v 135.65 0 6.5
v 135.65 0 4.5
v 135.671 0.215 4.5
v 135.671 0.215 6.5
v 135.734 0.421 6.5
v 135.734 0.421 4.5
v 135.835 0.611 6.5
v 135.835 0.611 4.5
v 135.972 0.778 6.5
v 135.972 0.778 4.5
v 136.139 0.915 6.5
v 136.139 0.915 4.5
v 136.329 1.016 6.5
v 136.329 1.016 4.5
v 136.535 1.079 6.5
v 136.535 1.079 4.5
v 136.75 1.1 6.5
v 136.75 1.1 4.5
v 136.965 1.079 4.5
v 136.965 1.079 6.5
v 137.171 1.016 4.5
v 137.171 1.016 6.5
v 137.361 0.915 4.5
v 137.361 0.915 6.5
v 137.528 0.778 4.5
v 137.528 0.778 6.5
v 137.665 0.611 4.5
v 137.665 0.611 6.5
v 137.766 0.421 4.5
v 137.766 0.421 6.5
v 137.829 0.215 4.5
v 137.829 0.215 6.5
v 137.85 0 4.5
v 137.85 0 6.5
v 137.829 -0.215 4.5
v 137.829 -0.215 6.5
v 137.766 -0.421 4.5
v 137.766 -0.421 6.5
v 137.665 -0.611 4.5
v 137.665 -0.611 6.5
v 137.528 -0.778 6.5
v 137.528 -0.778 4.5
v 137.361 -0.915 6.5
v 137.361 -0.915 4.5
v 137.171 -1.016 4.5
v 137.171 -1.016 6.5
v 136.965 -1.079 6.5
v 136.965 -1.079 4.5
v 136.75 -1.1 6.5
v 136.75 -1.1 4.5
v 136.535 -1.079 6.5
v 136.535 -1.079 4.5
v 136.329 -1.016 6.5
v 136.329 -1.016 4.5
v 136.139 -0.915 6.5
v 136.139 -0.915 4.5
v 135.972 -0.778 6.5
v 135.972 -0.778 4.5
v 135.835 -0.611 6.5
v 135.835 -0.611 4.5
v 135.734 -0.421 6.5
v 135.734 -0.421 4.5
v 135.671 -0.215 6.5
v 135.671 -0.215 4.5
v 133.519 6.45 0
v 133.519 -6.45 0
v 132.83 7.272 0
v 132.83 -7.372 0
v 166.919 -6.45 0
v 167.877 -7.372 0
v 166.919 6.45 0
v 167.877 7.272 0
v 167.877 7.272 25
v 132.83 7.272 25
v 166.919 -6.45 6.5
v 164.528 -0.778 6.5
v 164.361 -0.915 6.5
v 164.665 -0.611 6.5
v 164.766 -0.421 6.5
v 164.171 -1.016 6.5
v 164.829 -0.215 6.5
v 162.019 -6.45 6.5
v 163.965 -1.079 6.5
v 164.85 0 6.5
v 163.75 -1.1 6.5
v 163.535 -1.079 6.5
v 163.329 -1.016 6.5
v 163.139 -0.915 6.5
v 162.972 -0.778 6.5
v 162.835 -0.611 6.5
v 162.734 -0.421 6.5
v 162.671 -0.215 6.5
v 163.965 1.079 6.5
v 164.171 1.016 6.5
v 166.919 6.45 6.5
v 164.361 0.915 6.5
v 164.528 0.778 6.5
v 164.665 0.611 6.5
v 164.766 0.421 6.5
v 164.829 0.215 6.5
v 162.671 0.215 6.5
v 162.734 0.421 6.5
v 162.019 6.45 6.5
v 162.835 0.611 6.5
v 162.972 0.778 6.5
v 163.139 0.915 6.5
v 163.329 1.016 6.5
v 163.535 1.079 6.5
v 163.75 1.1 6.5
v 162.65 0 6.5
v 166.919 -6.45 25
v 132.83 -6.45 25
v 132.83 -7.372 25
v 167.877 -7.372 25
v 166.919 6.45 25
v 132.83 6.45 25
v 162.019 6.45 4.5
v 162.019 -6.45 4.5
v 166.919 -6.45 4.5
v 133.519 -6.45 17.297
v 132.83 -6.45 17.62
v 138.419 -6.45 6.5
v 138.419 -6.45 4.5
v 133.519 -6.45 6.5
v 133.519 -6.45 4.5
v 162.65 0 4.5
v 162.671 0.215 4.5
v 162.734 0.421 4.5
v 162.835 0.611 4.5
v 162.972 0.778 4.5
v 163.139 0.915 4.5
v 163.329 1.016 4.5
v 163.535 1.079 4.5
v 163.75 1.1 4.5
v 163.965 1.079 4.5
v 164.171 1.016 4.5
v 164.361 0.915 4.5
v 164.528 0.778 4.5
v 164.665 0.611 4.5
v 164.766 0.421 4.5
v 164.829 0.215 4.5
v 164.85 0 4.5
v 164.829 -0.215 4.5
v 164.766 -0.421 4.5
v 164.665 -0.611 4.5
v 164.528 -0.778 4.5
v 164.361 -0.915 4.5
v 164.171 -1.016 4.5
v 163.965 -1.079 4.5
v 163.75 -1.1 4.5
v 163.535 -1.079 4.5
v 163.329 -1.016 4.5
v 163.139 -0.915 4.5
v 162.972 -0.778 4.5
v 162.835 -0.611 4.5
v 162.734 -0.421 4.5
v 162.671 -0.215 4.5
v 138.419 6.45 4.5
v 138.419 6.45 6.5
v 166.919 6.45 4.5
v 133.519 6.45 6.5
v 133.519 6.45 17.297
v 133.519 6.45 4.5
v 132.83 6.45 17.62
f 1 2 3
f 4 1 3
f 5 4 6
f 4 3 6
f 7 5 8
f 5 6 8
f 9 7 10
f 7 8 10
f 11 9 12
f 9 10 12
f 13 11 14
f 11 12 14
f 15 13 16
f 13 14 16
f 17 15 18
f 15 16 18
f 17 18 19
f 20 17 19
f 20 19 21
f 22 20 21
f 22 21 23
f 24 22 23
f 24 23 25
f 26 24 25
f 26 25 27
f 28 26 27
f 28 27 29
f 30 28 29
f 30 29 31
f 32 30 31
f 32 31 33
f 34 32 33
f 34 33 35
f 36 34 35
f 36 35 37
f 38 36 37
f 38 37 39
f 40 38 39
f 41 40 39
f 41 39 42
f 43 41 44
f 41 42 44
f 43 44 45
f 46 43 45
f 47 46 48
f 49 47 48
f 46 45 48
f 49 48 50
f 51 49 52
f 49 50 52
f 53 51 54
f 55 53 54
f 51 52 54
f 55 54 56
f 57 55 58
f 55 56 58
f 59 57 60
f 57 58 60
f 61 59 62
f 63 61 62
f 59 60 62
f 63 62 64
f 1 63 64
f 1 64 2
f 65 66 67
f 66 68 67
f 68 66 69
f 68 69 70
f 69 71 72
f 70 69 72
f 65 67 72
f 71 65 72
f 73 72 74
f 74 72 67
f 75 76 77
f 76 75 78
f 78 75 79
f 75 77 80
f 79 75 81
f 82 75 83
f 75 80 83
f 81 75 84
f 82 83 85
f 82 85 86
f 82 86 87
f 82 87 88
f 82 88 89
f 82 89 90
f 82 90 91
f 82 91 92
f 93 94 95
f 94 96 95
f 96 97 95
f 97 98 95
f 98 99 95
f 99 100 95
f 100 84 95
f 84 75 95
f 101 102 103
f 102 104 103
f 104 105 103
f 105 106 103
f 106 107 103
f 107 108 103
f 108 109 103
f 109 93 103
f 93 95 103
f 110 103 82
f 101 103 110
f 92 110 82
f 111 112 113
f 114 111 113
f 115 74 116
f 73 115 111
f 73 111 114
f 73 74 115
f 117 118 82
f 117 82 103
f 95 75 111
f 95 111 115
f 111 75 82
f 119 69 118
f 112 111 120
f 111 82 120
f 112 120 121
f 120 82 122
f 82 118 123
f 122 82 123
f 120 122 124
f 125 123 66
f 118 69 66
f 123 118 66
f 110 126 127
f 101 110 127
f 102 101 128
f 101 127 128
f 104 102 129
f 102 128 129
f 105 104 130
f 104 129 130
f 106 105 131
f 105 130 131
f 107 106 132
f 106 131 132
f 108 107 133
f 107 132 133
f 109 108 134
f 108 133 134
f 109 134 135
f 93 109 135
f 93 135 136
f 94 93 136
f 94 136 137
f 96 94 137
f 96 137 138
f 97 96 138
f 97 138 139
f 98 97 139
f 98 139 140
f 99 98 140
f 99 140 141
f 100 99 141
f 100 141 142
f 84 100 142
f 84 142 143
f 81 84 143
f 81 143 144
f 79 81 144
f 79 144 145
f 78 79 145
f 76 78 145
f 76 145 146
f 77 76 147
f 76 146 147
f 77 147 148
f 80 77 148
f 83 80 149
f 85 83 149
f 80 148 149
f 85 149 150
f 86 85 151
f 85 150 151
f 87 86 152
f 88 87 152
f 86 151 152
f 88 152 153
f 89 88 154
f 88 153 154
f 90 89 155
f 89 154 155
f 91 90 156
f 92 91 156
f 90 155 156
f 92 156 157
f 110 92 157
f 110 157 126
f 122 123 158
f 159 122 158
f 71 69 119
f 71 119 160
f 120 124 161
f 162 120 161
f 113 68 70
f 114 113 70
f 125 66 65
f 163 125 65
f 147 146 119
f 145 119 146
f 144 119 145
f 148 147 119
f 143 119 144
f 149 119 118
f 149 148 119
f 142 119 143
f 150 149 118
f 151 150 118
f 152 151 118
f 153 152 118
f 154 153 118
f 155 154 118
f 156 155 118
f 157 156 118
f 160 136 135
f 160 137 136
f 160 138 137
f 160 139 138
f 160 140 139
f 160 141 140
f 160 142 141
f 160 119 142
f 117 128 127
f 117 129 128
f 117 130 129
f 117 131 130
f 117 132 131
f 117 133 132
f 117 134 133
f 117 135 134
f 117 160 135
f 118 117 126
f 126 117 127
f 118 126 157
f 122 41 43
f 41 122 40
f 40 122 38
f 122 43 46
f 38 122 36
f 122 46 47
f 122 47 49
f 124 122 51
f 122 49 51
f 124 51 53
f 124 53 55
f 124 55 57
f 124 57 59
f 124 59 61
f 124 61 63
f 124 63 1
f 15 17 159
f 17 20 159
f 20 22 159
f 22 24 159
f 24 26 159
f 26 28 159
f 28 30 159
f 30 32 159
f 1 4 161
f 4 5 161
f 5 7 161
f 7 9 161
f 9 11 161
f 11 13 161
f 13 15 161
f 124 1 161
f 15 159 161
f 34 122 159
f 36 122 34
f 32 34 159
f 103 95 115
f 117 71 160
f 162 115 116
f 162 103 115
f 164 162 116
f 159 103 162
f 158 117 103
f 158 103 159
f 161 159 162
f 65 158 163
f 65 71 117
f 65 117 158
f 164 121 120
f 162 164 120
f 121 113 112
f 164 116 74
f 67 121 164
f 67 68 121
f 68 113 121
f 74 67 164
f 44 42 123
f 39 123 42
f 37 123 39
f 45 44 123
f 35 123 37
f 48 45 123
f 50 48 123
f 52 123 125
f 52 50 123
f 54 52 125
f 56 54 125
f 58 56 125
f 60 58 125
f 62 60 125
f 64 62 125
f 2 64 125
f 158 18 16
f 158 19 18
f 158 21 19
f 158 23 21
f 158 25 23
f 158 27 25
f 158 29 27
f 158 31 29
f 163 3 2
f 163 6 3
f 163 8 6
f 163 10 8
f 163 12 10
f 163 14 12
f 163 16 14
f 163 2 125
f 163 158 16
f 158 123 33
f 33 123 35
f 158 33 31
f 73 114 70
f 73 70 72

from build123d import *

# Parameters (mm, degrees)
BOSS_EXTRUDE1_DEPTH = 25
SKETCH16_W          = 33.4
SKETCH16_H          = 12.9
CUT_EXTRUDE10_DEPTH = 4.5
SKETCH19_R          = 20
CUT_EXTRUDE14_DEPTH = 7.55
SKETCH17_W          = 23.6
SKETCH17_H          = 12.9
CUT_EXTRUDE11_DEPTH = 177.45821035
CUT_EXTRUDE13_DEPTH = 6.45
SKETCH20_W          = 33.4
SKETCH20_H          = 12.9
CUT_EXTRUDE15_DEPTH = 176.655202029
SKETCH21_R          = 1.1
CUT_EXTRUDE16_DEPTH = 177.45821035
SKETCH22_R          = 2
CUT_EXTRUDE17_DEPTH = 17.45
SKETCH23_W          = 162.562335495
SKETCH23_H          = 86.576971135
CUT_EXTRUDE18_DEPTH = 177.45821035
CUT_EXTRUDE19_DEPTH = 177.45821035
SKETCH26_W          = 6.440152625
SKETCH26_H          = 21.054345118
CUT_EXTRUDE20_DEPTH = 175.458005773


with BuildPart() as part:
    # Sketch1 → Boss-Extrude1 (new body)
    with BuildSketch(Plane.XY):
        with BuildLine():
            ThreePointArc((172.5, 0), (152.823244805, 26.363741023), (121.951138857, 15))
            Line((121.951138857, 15), (145, 15))
            Line((145, 15), (145, -15))
            Line((145, -15), (121.951138857, -15))
            ThreePointArc((121.951138857, -15), (152.823244805, -26.363741023), (172.5, 0))
        make_face()
        with BuildLine():
            Line((145, 15), (121.951138857, 15))
            ThreePointArc((121.951138857, 15), (117.5, 0), (121.951138857, -15))
            Line((121.951138857, -15), (145, -15))
            Line((145, -15), (145, 15))
        make_face()
        with BuildLine():
            Line((121.951138857, 15), (23.048861143, 15))
            ThreePointArc((23.048861143, 15), (26.363741023, 7.823244805), (27.5, 0))
            ThreePointArc((27.5, 0), (26.363741023, -7.823244805), (23.048861143, -15))
            Line((23.048861143, -15), (121.951138857, -15))
            ThreePointArc((121.951138857, -15), (117.5, 0), (121.951138857, 15))
        make_face()
        with BuildLine():
            ThreePointArc((13.228756555, -15), (-20, 0), (13.228756555, 15))
            Line((13.228756555, 15), (23.048861143, 15))
            ThreePointArc((23.048861143, 15), (-27.5, 0), (23.048861143, -15))
            Line((23.048861143, -15), (13.228756555, -15))
        make_face()
        with BuildLine():
            Line((23.048861143, 15), (13.228756555, 15))
            ThreePointArc((13.228756555, 15), (18.228756555, 8.228756555), (20, 0))
            ThreePointArc((20, 0), (18.228756555, -8.228756555), (13.228756555, -15))
            Line((13.228756555, -15), (23.048861143, -15))
            ThreePointArc((23.048861143, -15), (26.363741023, -7.823244805), (27.5, 0))
            ThreePointArc((27.5, 0), (26.363741023, 7.823244805), (23.048861143, 15))
        make_face()
        with BuildLine():
            Line((0, -15), (0, 15))
            Line((0, 15), (13.228756555, 15))
            ThreePointArc((13.228756555, 15), (-20, 0), (13.228756555, -15))
            Line((13.228756555, -15), (0, -15))
        make_face()
        with BuildLine():
            Line((13.228756555, 15), (0, 15))
            Line((0, 15), (0, -15))
            Line((0, -15), (13.228756555, -15))
            ThreePointArc((13.228756555, -15), (18.228756555, -8.228756555), (20, 0))
            ThreePointArc((20, 0), (18.228756555, 8.228756555), (13.228756555, 15))
        make_face()
    extrude(amount=BOSS_EXTRUDE1_DEPTH)

    # Sketch16 → Cut-Extrude10 (cut)
    with BuildSketch(Plane(origin=(0, 0, 0), x_dir=(-1, 0, 0), z_dir=(0, 0, -1))):
        with Locations((-150.21934279, 0)):
            Rectangle(SKETCH16_W, SKETCH16_H)
    extrude(amount=-CUT_EXTRUDE10_DEPTH, mode=Mode.SUBTRACT)

    # Sketch19 → Cut-Extrude14 (cut)
    with BuildSketch(Plane(origin=(0, 0, 0), x_dir=(-1, 0, 0), z_dir=(0, 0, -1))):
        Circle(SKETCH19_R)
    extrude(amount=-CUT_EXTRUDE14_DEPTH, mode=Mode.SUBTRACT)

    # Sketch17 → Cut-Extrude11 (cut, through all)
    with BuildSketch(Plane(origin=(0, 0, 0), x_dir=(-1, 0, 0), z_dir=(0, 0, -1))):
        with Locations((-150.21934279, 0)):
            Rectangle(SKETCH17_W, SKETCH17_H)
    extrude(amount=-CUT_EXTRUDE11_DEPTH, mode=Mode.SUBTRACT)

    # Sketch18 → Cut-Extrude13 (cut, symmetric)
    with BuildSketch(Plane(origin=(0, 0, 0), x_dir=(-1, 0, 0), z_dir=(0, -1, 0))):
        Polygon((-138.41934279, -15), (-138.41934279, -25), (-122.41934279, -25), (-122.41934279, -22.5), align=None)
    extrude(amount=CUT_EXTRUDE13_DEPTH, both=True, mode=Mode.SUBTRACT)

    # Sketch20 → Cut-Extrude15 (cut, through all)
    with BuildSketch(Plane(origin=(0, 0, 6.5), x_dir=(-1, 0, 0), z_dir=(0, 0, -1))):
        with Locations((-150.21934279, 0)):
            Rectangle(SKETCH20_W, SKETCH20_H)
    extrude(amount=-CUT_EXTRUDE15_DEPTH, mode=Mode.SUBTRACT)

    # Sketch21 → Cut-Extrude16 (cut, through all)
    with BuildSketch(Plane(origin=(0, 0, 0), x_dir=(-1, 0, 0), z_dir=(0, 0, -1))):
        with Locations((-163.75, 0)):
            Circle(SKETCH21_R)
        with Locations((-136.75, 0)):
            Circle(SKETCH21_R)
    extrude(amount=-CUT_EXTRUDE16_DEPTH, mode=Mode.SUBTRACT)

    # Sketch22 → Cut-Extrude17 (cut)
    with BuildSketch(Plane.XY.offset(25)):
        Circle(SKETCH22_R)
    extrude(amount=-CUT_EXTRUDE17_DEPTH, mode=Mode.SUBTRACT)

    # Sketch23 → Cut-Extrude18 (cut, through all)
    with BuildSketch(Plane(origin=(0, 0, 0), x_dir=(-1, 0, 0), z_dir=(0, 0, -1))):
        with Locations((-51.54910521, 1.570557299)):
            Rectangle(SKETCH23_W, SKETCH23_H)
    extrude(amount=-CUT_EXTRUDE18_DEPTH, mode=Mode.SUBTRACT)

    # Sketch24 → Cut-Extrude19 (cut, through all)
    with BuildSketch(Plane(origin=(0, 0, 0), x_dir=(-1, 0, 0), z_dir=(0, 0, -1))):
        with BuildLine():
            Line((-167.786941529, -7.371958929), (-171.493475075, -7.371958929))
            ThreePointArc((-171.493475075, -7.371958929), (-156.225736685, -25.104438569), (-132.830272958, -24.66065173))
            Line((-132.830272958, -24.66065173), (-132.830272958, -7.371958929))
            Line((-132.830272958, -7.371958929), (-167.786941529, -7.371958929))
        make_face()
        with BuildLine():
            Line((-185.462542345, -7.371958929), (-172.088300957, -7.371958929))
            Line((-172.088300957, -7.371958929), (-171.493475075, -7.371958929))
            ThreePointArc((-171.493475075, -7.371958929), (-172.499951334, -0.051736146), (-171.521025432, 7.272221809))
            Line((-171.521025432, 7.272221809), (-172.314497195, 7.272221809))
            Line((-172.314497195, 7.272221809), (-185.462542345, 7.272221809))
            Line((-185.462542345, 7.272221809), (-185.462542345, -7.371958929))
        make_face()
        with BuildLine():
            ThreePointArc((-132.830272958, 24.66065173), (-156.272946161, 25.083275003), (-171.521025432, 7.272221809))
            Line((-171.521025432, 7.272221809), (-167.786941529, 7.272221809))
            Line((-167.786941529, 7.272221809), (-132.830272958, 7.272221809))
            Line((-132.830272958, 7.272221809), (-132.830272958, 24.66065173))
        make_face()
    extrude(amount=-CUT_EXTRUDE19_DEPTH, mode=Mode.SUBTRACT)

    # Sketch26 → Cut-Extrude20 (cut, through all)
    with BuildSketch(Plane(origin=(0, 0, 0), x_dir=(-1, 0, 0), z_dir=(0, 0, -1))):
        with Locations((-171.097089858, -0.597985902)):
            Rectangle(SKETCH26_W, SKETCH26_H)
    extrude(amount=-CUT_EXTRUDE20_DEPTH, mode=Mode.SUBTRACT)


solid = part.part
